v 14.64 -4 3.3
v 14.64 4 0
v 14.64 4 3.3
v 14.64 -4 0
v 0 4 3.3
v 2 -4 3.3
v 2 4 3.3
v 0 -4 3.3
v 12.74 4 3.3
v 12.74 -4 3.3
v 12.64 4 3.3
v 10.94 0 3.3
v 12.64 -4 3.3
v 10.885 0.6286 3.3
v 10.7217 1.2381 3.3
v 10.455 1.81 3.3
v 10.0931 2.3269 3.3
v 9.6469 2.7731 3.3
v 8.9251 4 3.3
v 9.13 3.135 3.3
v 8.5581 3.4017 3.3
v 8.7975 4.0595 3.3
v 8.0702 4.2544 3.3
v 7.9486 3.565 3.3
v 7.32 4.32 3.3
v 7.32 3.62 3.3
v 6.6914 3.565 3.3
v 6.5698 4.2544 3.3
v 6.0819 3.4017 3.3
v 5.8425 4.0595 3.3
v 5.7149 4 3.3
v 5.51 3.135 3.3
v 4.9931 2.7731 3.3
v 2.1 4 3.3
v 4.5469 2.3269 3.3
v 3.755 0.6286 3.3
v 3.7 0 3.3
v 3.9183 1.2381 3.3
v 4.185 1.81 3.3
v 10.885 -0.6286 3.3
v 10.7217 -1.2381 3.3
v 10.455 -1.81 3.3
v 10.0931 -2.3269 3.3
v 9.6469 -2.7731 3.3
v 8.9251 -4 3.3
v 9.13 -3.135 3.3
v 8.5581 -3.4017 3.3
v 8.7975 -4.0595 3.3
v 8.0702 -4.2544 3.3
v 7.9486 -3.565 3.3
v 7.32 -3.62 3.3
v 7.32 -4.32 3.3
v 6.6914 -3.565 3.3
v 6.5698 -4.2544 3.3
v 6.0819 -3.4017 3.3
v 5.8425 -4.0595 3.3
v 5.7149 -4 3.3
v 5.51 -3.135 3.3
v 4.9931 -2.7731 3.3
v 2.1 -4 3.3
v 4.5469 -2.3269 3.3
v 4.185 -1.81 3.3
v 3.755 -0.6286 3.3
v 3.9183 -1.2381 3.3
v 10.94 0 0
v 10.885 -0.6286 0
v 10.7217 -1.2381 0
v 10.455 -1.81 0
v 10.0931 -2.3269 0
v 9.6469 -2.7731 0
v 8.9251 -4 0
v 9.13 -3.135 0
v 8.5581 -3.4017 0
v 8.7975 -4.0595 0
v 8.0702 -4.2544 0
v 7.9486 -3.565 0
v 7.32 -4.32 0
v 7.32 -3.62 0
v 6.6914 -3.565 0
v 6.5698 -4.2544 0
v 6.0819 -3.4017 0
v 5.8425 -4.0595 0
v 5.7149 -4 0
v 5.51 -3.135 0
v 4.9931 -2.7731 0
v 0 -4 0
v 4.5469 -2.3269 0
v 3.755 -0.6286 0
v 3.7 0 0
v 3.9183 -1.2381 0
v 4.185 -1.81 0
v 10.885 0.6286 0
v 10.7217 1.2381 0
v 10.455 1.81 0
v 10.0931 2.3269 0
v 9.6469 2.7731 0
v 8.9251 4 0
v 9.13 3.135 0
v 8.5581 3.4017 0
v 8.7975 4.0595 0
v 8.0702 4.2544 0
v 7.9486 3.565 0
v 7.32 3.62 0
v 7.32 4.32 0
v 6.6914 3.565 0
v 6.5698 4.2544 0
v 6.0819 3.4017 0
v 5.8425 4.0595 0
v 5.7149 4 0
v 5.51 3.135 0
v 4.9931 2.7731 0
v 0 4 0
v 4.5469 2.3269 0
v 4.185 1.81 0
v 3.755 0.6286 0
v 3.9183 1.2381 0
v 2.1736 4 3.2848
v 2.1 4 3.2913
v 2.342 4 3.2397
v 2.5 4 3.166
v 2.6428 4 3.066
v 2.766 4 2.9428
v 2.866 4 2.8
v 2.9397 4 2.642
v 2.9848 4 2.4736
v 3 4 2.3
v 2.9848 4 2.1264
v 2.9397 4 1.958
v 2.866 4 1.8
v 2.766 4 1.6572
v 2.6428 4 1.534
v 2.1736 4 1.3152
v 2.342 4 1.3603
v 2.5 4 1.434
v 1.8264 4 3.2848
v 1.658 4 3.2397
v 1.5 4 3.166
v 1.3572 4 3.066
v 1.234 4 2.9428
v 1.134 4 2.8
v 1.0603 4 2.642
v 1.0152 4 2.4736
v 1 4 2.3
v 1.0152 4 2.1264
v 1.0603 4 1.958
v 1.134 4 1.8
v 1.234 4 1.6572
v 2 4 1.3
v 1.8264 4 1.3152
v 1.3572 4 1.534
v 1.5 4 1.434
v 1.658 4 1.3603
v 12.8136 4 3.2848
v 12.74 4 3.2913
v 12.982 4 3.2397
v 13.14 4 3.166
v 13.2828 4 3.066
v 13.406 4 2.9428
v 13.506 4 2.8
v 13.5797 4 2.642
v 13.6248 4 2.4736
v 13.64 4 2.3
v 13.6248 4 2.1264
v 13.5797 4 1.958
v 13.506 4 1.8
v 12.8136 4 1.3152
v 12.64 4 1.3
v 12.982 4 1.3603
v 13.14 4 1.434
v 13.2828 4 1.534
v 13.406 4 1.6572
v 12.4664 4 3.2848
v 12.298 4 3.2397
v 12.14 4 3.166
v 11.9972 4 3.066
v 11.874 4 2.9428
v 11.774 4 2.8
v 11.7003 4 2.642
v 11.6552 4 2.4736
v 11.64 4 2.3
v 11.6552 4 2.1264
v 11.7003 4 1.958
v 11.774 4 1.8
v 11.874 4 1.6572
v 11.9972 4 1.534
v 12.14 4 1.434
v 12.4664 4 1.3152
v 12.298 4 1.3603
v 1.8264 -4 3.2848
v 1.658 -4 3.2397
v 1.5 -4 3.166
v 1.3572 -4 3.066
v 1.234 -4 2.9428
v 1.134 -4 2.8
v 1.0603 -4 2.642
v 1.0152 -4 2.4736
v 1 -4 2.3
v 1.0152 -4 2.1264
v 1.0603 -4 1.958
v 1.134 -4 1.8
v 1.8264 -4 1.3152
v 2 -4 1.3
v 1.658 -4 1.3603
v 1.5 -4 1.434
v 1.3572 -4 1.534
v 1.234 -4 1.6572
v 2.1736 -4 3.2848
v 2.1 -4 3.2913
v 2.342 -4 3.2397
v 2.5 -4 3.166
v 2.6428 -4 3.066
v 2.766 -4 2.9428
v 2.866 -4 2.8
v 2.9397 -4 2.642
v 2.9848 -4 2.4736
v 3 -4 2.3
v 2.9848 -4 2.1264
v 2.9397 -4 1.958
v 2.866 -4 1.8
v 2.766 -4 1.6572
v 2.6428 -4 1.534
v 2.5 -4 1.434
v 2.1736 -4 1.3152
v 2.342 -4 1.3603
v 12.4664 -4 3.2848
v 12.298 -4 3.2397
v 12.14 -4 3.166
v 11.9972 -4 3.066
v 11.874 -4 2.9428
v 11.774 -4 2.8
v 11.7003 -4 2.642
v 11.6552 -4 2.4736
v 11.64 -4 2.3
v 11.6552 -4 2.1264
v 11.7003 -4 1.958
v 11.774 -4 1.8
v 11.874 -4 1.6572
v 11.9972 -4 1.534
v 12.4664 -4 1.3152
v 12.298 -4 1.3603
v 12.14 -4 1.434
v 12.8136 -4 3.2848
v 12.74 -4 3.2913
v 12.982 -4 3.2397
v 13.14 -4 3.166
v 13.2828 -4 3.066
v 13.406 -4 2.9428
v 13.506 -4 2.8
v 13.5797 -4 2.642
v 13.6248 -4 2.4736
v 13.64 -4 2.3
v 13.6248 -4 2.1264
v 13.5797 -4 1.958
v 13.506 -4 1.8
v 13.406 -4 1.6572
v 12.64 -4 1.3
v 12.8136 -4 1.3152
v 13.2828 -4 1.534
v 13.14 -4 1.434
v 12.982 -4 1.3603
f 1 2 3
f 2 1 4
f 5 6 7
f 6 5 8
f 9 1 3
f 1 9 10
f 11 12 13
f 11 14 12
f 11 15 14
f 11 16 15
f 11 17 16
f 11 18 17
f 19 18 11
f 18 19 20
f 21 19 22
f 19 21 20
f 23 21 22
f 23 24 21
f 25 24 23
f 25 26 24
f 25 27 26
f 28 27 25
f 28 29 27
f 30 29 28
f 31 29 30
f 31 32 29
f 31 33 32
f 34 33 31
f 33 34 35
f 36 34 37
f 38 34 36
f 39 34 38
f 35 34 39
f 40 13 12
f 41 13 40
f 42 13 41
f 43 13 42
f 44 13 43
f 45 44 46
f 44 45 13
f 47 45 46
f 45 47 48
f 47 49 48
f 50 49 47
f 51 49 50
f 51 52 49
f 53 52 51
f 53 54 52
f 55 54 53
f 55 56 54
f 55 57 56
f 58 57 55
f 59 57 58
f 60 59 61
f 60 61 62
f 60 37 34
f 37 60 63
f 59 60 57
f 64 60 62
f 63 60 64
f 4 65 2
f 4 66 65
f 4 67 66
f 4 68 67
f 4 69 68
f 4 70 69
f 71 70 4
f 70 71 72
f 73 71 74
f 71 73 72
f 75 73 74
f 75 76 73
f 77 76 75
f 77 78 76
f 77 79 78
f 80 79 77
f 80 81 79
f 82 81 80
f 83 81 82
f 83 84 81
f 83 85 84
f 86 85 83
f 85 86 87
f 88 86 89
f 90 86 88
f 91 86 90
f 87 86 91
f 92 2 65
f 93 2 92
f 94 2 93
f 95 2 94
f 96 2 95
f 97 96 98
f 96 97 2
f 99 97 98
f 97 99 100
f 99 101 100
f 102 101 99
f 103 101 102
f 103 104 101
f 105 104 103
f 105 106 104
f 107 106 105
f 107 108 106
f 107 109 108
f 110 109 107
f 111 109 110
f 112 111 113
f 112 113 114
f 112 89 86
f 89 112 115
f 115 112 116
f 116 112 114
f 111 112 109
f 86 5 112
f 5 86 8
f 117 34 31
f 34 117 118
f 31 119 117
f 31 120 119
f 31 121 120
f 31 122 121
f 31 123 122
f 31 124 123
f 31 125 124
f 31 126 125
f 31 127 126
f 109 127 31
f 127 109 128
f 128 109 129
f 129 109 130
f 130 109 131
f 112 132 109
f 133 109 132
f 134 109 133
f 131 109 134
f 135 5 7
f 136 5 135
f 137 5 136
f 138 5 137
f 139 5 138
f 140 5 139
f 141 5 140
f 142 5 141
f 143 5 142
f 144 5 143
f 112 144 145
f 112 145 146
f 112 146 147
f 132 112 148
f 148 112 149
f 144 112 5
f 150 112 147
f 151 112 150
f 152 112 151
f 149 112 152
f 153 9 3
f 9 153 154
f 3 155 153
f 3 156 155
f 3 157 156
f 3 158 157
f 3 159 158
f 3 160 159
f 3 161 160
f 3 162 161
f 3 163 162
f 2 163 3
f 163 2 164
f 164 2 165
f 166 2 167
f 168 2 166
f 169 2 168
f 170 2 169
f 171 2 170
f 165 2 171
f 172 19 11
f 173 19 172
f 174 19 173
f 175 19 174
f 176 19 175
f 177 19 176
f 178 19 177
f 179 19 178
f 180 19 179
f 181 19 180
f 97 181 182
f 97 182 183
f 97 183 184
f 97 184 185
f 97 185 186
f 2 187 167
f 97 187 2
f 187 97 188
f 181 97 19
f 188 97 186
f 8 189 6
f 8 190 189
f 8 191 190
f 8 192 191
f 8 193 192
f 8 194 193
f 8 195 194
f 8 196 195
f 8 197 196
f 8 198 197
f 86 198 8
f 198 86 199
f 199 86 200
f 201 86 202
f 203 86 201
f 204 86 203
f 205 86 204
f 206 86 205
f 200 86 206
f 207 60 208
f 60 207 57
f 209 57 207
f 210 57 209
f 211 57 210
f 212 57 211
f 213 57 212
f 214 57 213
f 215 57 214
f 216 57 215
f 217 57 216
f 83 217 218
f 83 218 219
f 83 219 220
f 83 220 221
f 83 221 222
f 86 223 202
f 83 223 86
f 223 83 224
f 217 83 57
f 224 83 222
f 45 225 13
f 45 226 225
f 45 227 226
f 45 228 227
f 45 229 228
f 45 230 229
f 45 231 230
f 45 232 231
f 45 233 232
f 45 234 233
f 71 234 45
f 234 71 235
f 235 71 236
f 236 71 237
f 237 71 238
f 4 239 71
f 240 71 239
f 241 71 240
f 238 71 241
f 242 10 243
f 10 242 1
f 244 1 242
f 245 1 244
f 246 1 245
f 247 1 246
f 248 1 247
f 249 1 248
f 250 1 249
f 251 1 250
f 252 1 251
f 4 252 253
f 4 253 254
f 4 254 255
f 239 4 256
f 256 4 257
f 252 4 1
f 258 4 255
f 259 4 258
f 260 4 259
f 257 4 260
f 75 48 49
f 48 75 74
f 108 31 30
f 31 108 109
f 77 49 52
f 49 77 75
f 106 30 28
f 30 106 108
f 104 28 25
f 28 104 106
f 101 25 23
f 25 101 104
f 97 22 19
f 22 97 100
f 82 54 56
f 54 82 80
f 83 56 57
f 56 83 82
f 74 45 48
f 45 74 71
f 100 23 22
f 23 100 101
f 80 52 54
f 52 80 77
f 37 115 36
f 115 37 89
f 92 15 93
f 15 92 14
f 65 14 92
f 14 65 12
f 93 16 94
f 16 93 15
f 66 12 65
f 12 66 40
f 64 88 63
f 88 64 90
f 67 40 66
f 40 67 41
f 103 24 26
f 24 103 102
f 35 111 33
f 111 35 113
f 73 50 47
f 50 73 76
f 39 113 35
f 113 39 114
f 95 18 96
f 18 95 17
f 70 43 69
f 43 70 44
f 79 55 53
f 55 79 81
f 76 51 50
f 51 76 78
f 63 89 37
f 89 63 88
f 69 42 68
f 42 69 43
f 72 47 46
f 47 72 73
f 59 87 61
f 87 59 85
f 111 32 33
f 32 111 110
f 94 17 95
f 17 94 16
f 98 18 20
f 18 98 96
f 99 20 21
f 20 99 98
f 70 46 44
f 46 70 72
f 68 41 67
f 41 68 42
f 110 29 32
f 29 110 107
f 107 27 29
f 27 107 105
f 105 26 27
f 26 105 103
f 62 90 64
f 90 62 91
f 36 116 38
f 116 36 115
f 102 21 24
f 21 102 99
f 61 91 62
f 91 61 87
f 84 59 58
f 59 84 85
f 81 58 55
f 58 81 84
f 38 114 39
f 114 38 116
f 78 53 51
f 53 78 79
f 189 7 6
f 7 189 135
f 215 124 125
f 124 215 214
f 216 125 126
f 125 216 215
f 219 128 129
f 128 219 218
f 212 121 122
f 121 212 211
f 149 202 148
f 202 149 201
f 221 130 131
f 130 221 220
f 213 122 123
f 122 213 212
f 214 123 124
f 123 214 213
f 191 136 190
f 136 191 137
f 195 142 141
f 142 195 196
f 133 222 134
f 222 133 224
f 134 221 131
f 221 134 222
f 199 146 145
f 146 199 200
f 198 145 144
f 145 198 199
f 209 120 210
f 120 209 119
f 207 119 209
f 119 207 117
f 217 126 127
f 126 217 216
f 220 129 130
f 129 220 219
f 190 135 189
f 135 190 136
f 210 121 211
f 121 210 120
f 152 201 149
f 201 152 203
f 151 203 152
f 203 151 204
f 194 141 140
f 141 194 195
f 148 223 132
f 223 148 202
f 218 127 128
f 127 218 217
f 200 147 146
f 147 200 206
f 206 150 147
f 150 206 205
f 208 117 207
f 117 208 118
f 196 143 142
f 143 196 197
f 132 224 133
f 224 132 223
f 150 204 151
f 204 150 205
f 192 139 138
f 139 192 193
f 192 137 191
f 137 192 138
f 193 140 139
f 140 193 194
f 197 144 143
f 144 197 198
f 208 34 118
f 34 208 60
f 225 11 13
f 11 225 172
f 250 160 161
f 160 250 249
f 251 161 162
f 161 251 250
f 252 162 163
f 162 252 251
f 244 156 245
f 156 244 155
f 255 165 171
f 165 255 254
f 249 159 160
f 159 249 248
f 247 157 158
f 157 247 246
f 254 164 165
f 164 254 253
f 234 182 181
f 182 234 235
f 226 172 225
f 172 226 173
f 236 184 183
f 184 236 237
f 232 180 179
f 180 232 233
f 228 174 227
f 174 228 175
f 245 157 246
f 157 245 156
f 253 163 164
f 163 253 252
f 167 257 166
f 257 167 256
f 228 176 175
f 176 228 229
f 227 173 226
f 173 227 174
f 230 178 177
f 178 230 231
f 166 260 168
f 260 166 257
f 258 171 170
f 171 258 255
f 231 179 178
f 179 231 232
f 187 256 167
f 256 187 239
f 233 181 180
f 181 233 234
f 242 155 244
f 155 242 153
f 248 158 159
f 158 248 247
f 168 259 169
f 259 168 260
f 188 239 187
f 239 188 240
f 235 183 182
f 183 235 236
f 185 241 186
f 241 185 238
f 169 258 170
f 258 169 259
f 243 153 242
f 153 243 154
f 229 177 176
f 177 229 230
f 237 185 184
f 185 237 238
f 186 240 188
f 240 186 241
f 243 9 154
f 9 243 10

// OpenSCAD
// Customizable Simple Macro Lens Holder 
//
// Default parameters are for the lens:
//      Size: 7 x 3.3 mm
//      BFL : 6.47 mm
//      ELF : 8.0 mm
//
//  2016.05.18 by gsyan
//
//  update : 2016.05.20
//

//preview[view:south west, tilt:top diagonal];

/* [LENS] */

//Default parameters are for the lens : Size: 7 x 3.3 mm , BFL : 6.47 mm , ELF : 8.0 mm
lens_diameter = 7.04;

lens_height = 3.3;

lens_total = 1;

//Lens distance adapt for lens_total > 1
lens_distance = 0;

lens_holder_wall_thickness = 1.6;

/* [Ruber_Band] */

rubber_band_hole_diameter = 2;

rubber_band_holder_width = 8;

/* [Hidden] */
fn = 36;


module base() {        
    union() {
        //base : cube
        translate([0, rubber_band_holder_width/-2, 0]) 
        cube([lens_diameter+lens_holder_wall_thickness+rubber_band_hole_diameter*3,rubber_band_holder_width, lens_height]);    //base : cylinder    
        translate([(lens_diameter+lens_holder_wall_thickness+rubber_band_hole_diameter*3)/2, 0, 0])
        cylinder(h=lens_height*lens_total+lens_distance*(lens_total-1), r=(lens_diameter+lens_holder_wall_thickness)/2, $fn=fn);
    }
}
module holder() {
    difference() {
        base();
        
        //lens hole
        translate([(lens_diameter+lens_holder_wall_thickness+rubber_band_hole_diameter*3)/2, 0, -0.1])
        cylinder(h=lens_height*lens_total+lens_distance*(lens_total-1)+1, r=(lens_diameter+0.2)/2, $fn=fn);
        
        /*
        translate([(lens_diameter+lens_holder_wall_thickness+rubber_band_hole_diameter*3)/2, 0, -0.2])
        cylinder(h=lens_height, r=(lens_diameter-0.1)/2, $fn=fn);
        */
        
        //left rubber band hole
        translate([rubber_band_hole_diameter, (rubber_band_holder_width+1)/2, lens_height-rubber_band_hole_diameter/2]) rotate(a=[90,0,0]) 
        cylinder(h=rubber_band_holder_width+1, d=rubber_band_hole_diameter, $fn=36);
        translate([rubber_band_hole_diameter, (rubber_band_holder_width+1)/-2, lens_height-rubber_band_hole_diameter/2+0.5]) cube([0.1, rubber_band_holder_width+1,1]);
                
        //right rubber band hole
        translate([lens_diameter+lens_holder_wall_thickness+rubber_band_hole_diameter*2, (rubber_band_holder_width+1)/2, lens_height-rubber_band_hole_diameter/2]) rotate(a=[90,0,0]) 
        cylinder(h=rubber_band_holder_width+1, d=rubber_band_hole_diameter, $fn=36);
        translate([lens_diameter+lens_holder_wall_thickness+rubber_band_hole_diameter*2, (rubber_band_holder_width+1)/-2, lens_height-rubber_band_hole_diameter/2+0.5]) cube([0.1, rubber_band_holder_width+1,1]);
    }
}

holder();
